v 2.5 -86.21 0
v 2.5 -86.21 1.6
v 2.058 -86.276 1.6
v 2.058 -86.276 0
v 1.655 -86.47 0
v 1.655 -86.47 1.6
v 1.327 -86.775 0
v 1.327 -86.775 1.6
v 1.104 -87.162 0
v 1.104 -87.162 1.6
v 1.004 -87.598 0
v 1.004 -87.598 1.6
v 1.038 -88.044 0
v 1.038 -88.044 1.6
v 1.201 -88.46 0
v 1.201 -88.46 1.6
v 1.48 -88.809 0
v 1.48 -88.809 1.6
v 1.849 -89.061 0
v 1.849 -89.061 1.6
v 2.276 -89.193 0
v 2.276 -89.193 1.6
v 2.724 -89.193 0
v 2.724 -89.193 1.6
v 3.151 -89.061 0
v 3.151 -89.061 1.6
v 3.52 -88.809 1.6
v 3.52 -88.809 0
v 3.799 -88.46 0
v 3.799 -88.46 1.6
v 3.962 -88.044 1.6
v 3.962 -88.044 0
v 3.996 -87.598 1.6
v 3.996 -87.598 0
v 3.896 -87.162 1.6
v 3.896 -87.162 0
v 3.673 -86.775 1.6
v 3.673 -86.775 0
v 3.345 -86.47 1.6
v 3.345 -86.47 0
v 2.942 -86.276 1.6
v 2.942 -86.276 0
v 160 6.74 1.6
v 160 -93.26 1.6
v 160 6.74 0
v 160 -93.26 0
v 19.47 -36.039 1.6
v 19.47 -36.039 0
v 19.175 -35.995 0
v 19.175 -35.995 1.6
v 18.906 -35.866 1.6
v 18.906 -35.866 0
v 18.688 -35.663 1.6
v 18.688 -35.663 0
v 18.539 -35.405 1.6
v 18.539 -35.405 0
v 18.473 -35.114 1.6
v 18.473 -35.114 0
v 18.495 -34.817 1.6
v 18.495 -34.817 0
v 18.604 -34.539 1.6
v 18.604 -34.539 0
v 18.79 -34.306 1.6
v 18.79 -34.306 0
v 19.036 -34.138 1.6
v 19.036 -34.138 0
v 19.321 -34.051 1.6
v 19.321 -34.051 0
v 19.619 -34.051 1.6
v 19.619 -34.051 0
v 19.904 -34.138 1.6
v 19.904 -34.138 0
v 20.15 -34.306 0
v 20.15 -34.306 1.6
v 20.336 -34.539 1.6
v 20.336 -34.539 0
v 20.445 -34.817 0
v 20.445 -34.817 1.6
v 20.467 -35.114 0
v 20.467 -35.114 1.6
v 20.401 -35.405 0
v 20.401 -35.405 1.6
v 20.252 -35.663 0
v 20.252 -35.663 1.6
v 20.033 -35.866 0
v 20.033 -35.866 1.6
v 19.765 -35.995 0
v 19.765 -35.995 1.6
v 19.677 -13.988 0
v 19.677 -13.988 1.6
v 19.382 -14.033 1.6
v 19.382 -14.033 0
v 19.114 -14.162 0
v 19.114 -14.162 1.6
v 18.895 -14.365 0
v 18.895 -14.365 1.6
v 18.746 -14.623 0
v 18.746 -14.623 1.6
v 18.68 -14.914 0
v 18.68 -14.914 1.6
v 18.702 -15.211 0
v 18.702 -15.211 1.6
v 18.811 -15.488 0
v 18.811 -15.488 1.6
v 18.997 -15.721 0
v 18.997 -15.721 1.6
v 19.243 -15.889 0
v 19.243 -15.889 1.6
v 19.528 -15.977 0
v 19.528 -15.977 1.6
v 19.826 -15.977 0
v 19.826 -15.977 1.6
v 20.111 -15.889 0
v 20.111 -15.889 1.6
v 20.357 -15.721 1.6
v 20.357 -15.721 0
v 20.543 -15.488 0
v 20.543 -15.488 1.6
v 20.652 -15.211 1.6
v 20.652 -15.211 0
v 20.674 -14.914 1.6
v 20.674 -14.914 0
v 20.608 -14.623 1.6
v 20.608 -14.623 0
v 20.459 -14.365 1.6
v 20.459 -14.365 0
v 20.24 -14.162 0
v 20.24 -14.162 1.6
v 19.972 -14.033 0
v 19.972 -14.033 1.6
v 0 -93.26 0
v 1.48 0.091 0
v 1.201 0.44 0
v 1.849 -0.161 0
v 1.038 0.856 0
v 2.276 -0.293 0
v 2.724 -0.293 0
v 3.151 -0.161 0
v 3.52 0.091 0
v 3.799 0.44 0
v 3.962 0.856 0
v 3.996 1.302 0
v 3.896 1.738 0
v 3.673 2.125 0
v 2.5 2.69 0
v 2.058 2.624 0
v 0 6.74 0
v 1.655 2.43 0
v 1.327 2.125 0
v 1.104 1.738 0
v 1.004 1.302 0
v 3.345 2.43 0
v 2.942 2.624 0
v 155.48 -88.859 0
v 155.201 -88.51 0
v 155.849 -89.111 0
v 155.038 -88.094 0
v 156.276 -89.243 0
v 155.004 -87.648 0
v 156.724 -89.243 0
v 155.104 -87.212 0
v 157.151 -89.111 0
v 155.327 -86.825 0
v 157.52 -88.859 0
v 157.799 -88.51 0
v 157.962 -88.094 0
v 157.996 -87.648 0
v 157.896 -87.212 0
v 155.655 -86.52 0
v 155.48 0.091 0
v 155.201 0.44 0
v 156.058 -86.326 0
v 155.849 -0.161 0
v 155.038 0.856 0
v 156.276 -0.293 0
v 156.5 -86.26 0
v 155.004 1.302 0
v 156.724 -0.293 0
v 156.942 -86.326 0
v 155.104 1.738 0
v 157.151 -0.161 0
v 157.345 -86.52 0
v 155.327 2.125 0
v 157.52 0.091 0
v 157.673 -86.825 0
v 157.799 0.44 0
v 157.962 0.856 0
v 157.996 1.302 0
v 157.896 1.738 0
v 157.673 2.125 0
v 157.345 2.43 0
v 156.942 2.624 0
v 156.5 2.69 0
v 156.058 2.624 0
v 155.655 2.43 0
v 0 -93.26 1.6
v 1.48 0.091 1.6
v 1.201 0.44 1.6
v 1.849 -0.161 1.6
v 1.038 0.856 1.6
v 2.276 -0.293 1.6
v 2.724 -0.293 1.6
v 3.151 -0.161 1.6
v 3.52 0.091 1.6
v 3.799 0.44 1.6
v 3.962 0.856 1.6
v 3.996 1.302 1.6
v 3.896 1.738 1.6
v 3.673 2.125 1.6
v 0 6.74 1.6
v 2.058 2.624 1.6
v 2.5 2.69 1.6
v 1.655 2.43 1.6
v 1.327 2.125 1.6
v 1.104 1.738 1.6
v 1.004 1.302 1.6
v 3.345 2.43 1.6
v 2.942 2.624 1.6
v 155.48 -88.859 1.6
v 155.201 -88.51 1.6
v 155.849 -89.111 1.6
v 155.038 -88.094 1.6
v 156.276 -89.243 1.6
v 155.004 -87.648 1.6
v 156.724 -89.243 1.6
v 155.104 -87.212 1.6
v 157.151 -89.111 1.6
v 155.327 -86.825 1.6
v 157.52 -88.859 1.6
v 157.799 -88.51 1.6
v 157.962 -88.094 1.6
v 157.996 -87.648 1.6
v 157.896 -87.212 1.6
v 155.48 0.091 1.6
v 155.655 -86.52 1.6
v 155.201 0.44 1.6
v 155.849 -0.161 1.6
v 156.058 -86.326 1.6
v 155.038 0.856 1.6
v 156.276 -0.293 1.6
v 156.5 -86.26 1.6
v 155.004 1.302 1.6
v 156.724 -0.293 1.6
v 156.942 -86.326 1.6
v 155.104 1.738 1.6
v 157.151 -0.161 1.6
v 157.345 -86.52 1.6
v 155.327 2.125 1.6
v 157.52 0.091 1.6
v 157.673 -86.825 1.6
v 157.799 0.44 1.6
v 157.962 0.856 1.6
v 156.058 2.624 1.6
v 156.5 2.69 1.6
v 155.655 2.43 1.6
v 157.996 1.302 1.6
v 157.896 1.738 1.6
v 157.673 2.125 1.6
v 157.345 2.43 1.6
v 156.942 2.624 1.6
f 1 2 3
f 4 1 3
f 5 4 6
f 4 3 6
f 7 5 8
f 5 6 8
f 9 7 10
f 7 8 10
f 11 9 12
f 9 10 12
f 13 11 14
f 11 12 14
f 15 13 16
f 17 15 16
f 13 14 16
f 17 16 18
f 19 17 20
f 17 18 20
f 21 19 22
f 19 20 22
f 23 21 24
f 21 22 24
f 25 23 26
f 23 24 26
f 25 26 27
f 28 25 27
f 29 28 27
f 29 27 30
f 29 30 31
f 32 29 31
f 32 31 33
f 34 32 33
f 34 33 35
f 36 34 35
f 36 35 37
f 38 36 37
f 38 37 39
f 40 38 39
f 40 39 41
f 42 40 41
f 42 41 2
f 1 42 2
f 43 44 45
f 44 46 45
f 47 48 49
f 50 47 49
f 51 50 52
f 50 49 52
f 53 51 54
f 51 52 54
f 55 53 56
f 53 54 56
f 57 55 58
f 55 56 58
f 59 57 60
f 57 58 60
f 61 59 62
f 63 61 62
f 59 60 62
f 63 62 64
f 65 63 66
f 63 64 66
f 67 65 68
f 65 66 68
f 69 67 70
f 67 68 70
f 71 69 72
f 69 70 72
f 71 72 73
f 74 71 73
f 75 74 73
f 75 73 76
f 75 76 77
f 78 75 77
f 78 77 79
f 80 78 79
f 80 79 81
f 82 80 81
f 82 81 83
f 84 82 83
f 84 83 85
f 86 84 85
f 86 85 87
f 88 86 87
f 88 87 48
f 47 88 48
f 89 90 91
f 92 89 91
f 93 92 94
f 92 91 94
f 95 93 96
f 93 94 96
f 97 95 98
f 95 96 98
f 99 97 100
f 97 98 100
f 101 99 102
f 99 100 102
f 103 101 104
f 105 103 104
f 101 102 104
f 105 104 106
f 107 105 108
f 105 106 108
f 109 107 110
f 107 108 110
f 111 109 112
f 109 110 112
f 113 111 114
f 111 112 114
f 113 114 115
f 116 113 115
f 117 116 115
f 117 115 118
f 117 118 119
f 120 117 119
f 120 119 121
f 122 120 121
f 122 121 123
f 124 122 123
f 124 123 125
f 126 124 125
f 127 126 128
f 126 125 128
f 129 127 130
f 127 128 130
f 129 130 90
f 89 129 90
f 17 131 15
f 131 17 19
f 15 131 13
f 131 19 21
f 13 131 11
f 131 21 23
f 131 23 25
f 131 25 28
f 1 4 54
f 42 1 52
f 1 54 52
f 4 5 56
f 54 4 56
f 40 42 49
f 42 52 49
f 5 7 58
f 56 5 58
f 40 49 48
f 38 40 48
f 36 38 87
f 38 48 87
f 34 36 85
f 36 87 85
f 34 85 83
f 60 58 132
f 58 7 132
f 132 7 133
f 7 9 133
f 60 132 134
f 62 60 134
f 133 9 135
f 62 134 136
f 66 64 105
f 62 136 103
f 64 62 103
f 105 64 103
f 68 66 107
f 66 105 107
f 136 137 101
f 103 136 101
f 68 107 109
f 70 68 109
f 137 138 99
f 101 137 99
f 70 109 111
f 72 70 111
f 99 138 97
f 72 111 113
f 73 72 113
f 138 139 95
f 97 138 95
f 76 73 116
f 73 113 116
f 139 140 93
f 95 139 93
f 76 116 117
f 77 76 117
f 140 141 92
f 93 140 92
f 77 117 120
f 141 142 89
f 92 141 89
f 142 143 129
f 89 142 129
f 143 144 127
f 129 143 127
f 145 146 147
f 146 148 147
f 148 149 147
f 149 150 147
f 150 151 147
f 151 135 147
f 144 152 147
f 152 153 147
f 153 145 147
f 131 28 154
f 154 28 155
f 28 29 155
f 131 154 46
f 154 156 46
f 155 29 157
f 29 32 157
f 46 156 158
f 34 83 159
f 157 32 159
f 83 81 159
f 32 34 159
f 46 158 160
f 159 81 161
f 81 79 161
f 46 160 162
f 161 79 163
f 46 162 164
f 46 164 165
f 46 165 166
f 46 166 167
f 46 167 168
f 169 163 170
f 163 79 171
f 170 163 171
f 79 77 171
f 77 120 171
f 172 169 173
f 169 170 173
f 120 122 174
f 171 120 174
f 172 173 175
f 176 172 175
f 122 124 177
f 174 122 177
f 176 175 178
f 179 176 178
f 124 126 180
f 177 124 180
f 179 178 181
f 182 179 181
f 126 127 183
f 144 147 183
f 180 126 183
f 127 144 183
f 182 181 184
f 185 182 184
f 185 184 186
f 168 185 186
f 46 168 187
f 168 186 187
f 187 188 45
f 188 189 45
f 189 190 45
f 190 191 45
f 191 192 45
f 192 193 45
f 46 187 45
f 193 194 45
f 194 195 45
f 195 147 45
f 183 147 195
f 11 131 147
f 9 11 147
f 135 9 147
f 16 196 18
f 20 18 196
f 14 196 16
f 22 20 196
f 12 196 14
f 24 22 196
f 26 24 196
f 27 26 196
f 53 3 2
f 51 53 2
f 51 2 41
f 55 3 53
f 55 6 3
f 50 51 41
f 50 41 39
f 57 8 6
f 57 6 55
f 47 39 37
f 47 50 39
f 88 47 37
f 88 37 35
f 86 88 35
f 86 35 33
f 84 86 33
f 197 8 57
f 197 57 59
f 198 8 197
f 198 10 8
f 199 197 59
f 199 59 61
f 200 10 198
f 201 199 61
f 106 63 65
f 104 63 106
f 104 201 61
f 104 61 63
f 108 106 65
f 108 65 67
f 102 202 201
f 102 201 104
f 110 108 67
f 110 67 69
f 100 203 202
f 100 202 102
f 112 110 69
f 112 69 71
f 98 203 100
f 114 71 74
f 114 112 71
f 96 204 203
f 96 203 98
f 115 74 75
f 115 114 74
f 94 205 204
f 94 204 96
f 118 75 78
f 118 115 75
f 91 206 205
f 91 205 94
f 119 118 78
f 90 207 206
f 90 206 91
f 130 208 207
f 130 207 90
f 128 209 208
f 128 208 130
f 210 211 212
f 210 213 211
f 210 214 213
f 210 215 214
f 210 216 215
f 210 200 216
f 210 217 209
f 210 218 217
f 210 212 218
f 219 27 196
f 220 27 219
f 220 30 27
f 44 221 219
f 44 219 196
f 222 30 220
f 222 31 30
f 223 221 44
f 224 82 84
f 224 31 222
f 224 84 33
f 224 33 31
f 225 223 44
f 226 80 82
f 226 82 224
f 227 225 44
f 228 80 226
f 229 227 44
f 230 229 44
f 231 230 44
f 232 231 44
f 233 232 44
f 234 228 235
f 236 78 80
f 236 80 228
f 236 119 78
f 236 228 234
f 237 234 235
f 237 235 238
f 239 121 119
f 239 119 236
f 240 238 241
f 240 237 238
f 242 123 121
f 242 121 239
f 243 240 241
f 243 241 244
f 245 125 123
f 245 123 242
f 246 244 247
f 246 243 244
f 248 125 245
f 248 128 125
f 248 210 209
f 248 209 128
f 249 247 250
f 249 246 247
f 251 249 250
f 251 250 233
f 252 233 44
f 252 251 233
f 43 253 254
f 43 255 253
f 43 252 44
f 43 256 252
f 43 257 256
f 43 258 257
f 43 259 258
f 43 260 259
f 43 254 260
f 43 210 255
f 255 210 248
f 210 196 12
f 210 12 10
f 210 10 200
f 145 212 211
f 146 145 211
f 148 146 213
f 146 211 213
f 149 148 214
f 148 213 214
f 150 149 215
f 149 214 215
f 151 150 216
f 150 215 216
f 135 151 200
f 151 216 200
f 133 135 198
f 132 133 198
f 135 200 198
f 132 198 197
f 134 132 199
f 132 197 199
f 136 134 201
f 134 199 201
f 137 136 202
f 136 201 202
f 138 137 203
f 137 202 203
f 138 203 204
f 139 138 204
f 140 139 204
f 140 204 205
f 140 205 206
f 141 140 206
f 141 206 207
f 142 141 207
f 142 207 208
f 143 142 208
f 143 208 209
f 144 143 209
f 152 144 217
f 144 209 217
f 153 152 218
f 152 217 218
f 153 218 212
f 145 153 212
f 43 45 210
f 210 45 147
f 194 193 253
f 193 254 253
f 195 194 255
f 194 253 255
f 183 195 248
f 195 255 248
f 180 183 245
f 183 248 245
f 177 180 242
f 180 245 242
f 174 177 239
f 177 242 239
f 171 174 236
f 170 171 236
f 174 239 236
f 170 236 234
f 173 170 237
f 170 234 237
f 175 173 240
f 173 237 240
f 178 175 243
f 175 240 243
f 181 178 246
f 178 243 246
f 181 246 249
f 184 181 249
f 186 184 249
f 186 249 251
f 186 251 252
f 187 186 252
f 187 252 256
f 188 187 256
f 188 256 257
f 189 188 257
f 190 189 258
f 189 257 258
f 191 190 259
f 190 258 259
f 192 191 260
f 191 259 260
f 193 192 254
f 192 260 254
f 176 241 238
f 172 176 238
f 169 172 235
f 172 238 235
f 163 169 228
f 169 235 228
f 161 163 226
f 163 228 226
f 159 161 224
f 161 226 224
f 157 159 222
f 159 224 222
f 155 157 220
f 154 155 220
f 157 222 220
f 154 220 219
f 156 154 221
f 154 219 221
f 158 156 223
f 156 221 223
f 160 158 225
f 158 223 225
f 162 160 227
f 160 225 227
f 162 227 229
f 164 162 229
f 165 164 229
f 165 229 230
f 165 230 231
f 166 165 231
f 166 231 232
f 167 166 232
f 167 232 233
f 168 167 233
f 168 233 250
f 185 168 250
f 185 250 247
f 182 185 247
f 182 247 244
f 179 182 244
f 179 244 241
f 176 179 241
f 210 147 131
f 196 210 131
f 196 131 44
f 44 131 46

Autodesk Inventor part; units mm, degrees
ref_plane "YZ Plane" through (0, 0, 0) normal (1, 0, 0) x (0, 1, 0)
ref_plane "XZ Plane" through (0, 0, 0) normal (0, 1, 0) x (-1, 0, 0)
ref_plane "XY Plane" through (0, 0, 0) normal (0, 0, 1) x (1, 0, 0)
sketch "Skizze1" plane through (0, 0, 0) normal (0, 0, 1) x (1, 0, 0)
  line L0 (0, -93.2598) -> (160, -93.2598)
  line L1 (160, -93.2598) -> (160, 6.7402)
  line L2 (160, 6.7402) -> (0, 6.7402)
  line L3 (0, 6.7402) -> (0, -93.2598)
  circle A0 centre (5.4, -3.8898) radius 0.4
  point P0 (2.5, 1.1902)
  point P1 (156.5, 1.1902)
  point P2 (2.5, -87.7098)
  point P3 (156.5, -87.7598)
  point P4 (19.5566, -14.9779)
  dimension "d0" = 160
  dimension "d1" = 100
  dimension "d146" = 0.8
  dimension "d147" = 5.4
  dimension "d148" = 10.63
  dimension "d162" = 5.55
  dimension "d163" = 2.5
  dimension "d164" = 154
  dimension "d165" = 88.9
  dimension "d194" = 5.55
extrude "Extrusion1" add sketch "Skizze1" along normal blind 1.6 contours L3 L2 L1 L0 | A0
sketch "Skizze2" plane through (0, 0, 1.6) normal (0, 0, 1) x (1, 0, 0)
  line L0 (0, -93.2598) -> (0, 6.7402) projected
  line L1 (4.4, -2.8898) -> (6.4, -2.8898)
  line L2 (6.4, -2.8898) -> (6.4, -4.8898)
  line L3 (6.4, -4.8898) -> (4.4, -4.8898)
  line L4 (4.4, -4.8898) -> (4.4, -2.8898)
  line L5 (0, 6.7402) -> (160, 6.7402) projected
  dimension "d4" = 2
  dimension "d5" = 2
  dimension "d7" = 4.4
  dimension "d145" = 9.63
hole "Bohrung12" at (2.5, 1.1902, 0) at (156.5, 1.1902, 0) at (2.5, -87.7098, 0) at (156.5, -87.7598, 0) direction (0, 0, 1) diameter 3 end through all
sketch "Skizze7" plane through (0, 0, 0) normal (0, 0, -1) x (-1, 0, 0)
  circle A0 centre (-19.677, -14.9883) radius 1.0356
  point P0 (0, 0)
hole "Hole14" at (19.677, -14.9883, 0) direction (0, 0, 1) diameter 2 depth 4 tip angle 118
sketch "Skizze8" plane through (0, 0, 1.6) normal (0, 0, 1) x (1, 0, 0)
  point P0 (0, 0)
  point P1 (19.4698, -35.0394)
hole "Hole15" at (19.4698, -35.0394, 1.6) direction (0, 0, -1) diameter 2 depth 4 tip angle 118
properties part number "Leiterplatte" material "Polyaryletherketone Resin"
